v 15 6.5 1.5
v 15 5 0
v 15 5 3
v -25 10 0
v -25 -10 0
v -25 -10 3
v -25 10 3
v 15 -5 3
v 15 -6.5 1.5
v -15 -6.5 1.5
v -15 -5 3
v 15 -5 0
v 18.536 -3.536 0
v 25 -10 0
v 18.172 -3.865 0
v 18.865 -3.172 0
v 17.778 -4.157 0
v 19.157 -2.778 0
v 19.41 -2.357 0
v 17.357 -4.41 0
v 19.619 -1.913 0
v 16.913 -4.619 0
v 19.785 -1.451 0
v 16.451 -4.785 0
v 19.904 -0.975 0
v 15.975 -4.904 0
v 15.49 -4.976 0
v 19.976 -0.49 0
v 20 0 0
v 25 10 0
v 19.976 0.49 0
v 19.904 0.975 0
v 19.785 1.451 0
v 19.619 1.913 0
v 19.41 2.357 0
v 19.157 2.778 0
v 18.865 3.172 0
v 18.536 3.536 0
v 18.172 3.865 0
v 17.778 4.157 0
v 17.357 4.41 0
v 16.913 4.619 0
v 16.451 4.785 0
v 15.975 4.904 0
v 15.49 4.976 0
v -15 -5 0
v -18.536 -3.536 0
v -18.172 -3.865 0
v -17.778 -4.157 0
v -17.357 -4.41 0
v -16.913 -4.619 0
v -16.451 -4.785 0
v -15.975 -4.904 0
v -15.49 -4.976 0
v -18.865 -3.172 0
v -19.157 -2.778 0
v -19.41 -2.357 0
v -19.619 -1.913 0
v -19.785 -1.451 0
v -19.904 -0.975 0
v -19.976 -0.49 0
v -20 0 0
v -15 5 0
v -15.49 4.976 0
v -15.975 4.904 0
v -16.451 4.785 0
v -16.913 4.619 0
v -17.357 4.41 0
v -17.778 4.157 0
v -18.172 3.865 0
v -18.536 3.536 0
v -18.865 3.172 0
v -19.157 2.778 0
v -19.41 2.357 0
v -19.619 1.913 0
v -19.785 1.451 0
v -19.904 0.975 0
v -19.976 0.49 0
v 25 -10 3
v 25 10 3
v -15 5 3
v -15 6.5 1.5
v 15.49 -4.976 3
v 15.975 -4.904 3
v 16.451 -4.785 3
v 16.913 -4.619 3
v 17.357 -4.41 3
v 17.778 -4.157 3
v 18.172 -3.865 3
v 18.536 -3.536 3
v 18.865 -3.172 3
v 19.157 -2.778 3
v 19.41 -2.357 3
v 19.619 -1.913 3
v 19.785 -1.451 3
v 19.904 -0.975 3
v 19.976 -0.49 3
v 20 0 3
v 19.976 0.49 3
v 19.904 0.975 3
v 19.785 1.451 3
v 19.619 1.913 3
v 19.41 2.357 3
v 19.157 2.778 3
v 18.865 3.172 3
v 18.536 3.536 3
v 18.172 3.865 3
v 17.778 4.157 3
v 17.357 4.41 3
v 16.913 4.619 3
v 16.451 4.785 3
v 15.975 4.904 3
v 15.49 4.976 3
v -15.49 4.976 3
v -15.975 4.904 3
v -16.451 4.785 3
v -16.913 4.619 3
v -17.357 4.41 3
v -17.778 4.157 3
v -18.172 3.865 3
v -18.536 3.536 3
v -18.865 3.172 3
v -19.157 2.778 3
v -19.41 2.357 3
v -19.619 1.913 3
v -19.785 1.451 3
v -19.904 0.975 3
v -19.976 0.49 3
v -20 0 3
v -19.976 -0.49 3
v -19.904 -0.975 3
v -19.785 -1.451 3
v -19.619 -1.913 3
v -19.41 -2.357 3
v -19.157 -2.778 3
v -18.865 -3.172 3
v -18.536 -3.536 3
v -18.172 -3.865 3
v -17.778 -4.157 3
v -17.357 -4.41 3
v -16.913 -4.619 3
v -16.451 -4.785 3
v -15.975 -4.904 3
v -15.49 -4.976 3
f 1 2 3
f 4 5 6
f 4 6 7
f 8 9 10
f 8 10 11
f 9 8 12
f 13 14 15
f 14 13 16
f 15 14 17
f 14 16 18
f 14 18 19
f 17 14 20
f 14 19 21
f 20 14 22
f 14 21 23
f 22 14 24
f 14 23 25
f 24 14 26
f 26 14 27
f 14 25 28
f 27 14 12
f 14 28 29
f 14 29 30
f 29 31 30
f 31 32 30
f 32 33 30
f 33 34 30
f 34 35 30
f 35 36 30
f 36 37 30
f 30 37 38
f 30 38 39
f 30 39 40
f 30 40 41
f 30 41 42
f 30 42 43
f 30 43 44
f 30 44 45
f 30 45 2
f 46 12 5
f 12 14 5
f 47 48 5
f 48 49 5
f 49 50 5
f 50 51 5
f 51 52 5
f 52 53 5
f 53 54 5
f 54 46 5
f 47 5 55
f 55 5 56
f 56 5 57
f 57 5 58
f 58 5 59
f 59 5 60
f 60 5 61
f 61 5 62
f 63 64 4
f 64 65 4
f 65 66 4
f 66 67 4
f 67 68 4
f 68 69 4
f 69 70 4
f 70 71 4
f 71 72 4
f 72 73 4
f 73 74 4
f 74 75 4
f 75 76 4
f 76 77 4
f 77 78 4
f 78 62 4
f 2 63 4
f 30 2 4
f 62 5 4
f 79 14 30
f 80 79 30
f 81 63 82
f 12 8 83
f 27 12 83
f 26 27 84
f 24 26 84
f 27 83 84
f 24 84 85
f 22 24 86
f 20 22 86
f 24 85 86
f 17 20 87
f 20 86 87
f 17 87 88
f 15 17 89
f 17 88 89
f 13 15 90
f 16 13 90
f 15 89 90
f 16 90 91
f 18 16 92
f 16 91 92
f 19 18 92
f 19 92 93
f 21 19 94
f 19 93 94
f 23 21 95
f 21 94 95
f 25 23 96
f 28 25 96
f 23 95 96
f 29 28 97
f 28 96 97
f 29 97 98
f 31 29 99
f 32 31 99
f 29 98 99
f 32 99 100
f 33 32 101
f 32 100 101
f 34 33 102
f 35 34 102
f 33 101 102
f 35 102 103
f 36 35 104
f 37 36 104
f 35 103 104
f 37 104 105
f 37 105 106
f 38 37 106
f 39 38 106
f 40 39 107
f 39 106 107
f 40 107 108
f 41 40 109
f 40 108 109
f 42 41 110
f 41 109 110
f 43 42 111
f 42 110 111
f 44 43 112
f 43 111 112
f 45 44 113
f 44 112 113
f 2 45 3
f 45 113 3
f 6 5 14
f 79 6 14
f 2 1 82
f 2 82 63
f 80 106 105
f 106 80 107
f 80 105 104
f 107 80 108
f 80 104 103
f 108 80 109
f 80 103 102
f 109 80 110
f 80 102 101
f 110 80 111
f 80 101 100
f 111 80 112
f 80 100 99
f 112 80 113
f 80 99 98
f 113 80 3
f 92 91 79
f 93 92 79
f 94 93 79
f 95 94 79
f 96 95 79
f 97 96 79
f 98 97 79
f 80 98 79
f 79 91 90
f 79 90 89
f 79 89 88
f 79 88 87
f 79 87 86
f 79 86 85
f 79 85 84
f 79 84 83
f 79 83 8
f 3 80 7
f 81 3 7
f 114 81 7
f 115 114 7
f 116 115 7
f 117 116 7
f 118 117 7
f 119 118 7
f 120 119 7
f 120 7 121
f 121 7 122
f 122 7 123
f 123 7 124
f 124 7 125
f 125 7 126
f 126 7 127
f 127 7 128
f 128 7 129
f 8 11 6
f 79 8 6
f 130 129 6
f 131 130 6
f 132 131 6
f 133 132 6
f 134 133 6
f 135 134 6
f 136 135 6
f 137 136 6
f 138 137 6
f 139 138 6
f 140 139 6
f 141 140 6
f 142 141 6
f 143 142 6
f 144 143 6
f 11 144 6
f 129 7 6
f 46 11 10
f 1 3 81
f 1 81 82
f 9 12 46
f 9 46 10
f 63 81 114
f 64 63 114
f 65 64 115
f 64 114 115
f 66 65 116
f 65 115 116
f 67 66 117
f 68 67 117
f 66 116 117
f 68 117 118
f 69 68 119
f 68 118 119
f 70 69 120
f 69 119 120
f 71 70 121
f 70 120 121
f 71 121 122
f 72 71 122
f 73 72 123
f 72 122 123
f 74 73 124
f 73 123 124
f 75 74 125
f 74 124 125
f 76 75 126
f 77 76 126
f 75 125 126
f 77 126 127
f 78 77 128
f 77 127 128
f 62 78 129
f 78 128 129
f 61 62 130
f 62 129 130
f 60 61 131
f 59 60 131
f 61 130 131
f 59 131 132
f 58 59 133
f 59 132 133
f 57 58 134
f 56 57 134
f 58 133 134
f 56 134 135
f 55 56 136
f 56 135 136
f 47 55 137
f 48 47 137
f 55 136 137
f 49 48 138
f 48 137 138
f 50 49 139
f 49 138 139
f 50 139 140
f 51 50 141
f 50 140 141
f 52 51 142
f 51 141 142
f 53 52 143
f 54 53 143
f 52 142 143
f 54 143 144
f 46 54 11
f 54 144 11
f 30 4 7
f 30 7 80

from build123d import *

# Parameters (mm, degrees)
SKETCH_1_W          = 50
SKETCH_1_H          = 20
EXTRUDE_3_DEPTH     = 3
SKETCH_2_R          = 5
SKETCH_2_W          = 30
SKETCH_2_H          = 10
CUT_EXTRUDE_1_DEPTH = 3
SKETCH_3_W          = 30
SKETCH_3_H          = 3
CUT_EXTRUDE_2_DEPTH = 1.5
EXTRUDE_4_REACH     = 43.34
SKETCH_5_W          = 30
SKETCH_5_H          = 3
CUT_EXTRUDE_3_DEPTH = 1.5
EXTRUDE_5_REACH     = 43.34


with BuildPart() as part:
    # 스케치1 → 보스-돌출3 (new body)
    with BuildSketch(Plane.XY):
        Rectangle(SKETCH_1_W, SKETCH_1_H)
    extrude(amount=EXTRUDE_3_DEPTH)

    # 스케치2 → 컷-돌출1 (cut)
    with BuildSketch(Plane.XY.offset(3)):
        with Locations((-15, 0)):
            Circle(SKETCH_2_R)
        with Locations((15, 0)):
            Circle(SKETCH_2_R)
        Rectangle(SKETCH_2_W, SKETCH_2_H)
    extrude(amount=-CUT_EXTRUDE_1_DEPTH, mode=Mode.SUBTRACT)

    # 스케치3 → 컷-돌출2 (cut)
    with BuildSketch(Plane.XZ.offset(-5)):
        with Locations((0, 1.5)):
            Rectangle(SKETCH_3_W, SKETCH_3_H)
    extrude(amount=-CUT_EXTRUDE_2_DEPTH, mode=Mode.SUBTRACT)

    # 스케치4 → 보스-돌출4 (add, up to next)
    with BuildSketch(Plane(origin=(-15, 0, 0), x_dir=(0, 0, -1), z_dir=(1, 0, 0)), mode=Mode.PRIVATE) as extrude_4_sk1:
        Polygon((-3, 6.5), (-3, 5), (-1.5, 6.5), align=None)
    extrude_4_tool1 = extrude(extrude_4_sk1.sketch, amount=EXTRUDE_4_REACH, mode=Mode.PRIVATE) - part.part
    # 스케치4 → 보스-돌출4 (add, up to next)
    with BuildSketch(Plane(origin=(-15, 0, 0), x_dir=(0, 0, -1), z_dir=(1, 0, 0)), mode=Mode.PRIVATE) as extrude_4_sk2:
        Polygon((0, 6.5), (-1.5, 6.5), (0, 5), align=None)
    extrude_4_tool2 = extrude(extrude_4_sk2.sketch, amount=EXTRUDE_4_REACH, mode=Mode.PRIVATE) - part.part
    add(extrude_4_tool1.solids().sort_by_distance((-15, 6, 2.5))[0])
    add(extrude_4_tool2.solids().sort_by_distance((-15, 6, 0.5))[0])

    # 스케치5 → 컷-돌출3 (cut)
    with BuildSketch(Plane(origin=(0, -5, 0), x_dir=(1, 0, 0), z_dir=(0, 1, 0))):
        with Locations((0, -1.5)):
            Rectangle(SKETCH_5_W, SKETCH_5_H)
    extrude(amount=-CUT_EXTRUDE_3_DEPTH, mode=Mode.SUBTRACT)

    # 스케치6 → 보스-돌출5 (add, up to next)
    with BuildSketch(Plane(origin=(-15, 0, 0), x_dir=(0, 0, -1), z_dir=(1, 0, 0)), mode=Mode.PRIVATE) as extrude_5_sk1:
        Polygon((-1.5, -6.5), (-3, -5), (-3, -6.5), align=None)
    extrude_5_tool1 = extrude(extrude_5_sk1.sketch, amount=EXTRUDE_5_REACH, mode=Mode.PRIVATE) - part.part
    # 스케치6 → 보스-돌출5 (add, up to next)
    with BuildSketch(Plane(origin=(-15, 0, 0), x_dir=(0, 0, -1), z_dir=(1, 0, 0)), mode=Mode.PRIVATE) as extrude_5_sk2:
        Polygon((0, -5), (-1.5, -6.5), (0, -6.5), align=None)
    extrude_5_tool2 = extrude(extrude_5_sk2.sketch, amount=EXTRUDE_5_REACH, mode=Mode.PRIVATE) - part.part
    add(extrude_5_tool1.solids().sort_by_distance((-15, -6, 2.5))[0])
    add(extrude_5_tool2.solids().sort_by_distance((-15, -6, 0.5))[0])


solid = part.part
